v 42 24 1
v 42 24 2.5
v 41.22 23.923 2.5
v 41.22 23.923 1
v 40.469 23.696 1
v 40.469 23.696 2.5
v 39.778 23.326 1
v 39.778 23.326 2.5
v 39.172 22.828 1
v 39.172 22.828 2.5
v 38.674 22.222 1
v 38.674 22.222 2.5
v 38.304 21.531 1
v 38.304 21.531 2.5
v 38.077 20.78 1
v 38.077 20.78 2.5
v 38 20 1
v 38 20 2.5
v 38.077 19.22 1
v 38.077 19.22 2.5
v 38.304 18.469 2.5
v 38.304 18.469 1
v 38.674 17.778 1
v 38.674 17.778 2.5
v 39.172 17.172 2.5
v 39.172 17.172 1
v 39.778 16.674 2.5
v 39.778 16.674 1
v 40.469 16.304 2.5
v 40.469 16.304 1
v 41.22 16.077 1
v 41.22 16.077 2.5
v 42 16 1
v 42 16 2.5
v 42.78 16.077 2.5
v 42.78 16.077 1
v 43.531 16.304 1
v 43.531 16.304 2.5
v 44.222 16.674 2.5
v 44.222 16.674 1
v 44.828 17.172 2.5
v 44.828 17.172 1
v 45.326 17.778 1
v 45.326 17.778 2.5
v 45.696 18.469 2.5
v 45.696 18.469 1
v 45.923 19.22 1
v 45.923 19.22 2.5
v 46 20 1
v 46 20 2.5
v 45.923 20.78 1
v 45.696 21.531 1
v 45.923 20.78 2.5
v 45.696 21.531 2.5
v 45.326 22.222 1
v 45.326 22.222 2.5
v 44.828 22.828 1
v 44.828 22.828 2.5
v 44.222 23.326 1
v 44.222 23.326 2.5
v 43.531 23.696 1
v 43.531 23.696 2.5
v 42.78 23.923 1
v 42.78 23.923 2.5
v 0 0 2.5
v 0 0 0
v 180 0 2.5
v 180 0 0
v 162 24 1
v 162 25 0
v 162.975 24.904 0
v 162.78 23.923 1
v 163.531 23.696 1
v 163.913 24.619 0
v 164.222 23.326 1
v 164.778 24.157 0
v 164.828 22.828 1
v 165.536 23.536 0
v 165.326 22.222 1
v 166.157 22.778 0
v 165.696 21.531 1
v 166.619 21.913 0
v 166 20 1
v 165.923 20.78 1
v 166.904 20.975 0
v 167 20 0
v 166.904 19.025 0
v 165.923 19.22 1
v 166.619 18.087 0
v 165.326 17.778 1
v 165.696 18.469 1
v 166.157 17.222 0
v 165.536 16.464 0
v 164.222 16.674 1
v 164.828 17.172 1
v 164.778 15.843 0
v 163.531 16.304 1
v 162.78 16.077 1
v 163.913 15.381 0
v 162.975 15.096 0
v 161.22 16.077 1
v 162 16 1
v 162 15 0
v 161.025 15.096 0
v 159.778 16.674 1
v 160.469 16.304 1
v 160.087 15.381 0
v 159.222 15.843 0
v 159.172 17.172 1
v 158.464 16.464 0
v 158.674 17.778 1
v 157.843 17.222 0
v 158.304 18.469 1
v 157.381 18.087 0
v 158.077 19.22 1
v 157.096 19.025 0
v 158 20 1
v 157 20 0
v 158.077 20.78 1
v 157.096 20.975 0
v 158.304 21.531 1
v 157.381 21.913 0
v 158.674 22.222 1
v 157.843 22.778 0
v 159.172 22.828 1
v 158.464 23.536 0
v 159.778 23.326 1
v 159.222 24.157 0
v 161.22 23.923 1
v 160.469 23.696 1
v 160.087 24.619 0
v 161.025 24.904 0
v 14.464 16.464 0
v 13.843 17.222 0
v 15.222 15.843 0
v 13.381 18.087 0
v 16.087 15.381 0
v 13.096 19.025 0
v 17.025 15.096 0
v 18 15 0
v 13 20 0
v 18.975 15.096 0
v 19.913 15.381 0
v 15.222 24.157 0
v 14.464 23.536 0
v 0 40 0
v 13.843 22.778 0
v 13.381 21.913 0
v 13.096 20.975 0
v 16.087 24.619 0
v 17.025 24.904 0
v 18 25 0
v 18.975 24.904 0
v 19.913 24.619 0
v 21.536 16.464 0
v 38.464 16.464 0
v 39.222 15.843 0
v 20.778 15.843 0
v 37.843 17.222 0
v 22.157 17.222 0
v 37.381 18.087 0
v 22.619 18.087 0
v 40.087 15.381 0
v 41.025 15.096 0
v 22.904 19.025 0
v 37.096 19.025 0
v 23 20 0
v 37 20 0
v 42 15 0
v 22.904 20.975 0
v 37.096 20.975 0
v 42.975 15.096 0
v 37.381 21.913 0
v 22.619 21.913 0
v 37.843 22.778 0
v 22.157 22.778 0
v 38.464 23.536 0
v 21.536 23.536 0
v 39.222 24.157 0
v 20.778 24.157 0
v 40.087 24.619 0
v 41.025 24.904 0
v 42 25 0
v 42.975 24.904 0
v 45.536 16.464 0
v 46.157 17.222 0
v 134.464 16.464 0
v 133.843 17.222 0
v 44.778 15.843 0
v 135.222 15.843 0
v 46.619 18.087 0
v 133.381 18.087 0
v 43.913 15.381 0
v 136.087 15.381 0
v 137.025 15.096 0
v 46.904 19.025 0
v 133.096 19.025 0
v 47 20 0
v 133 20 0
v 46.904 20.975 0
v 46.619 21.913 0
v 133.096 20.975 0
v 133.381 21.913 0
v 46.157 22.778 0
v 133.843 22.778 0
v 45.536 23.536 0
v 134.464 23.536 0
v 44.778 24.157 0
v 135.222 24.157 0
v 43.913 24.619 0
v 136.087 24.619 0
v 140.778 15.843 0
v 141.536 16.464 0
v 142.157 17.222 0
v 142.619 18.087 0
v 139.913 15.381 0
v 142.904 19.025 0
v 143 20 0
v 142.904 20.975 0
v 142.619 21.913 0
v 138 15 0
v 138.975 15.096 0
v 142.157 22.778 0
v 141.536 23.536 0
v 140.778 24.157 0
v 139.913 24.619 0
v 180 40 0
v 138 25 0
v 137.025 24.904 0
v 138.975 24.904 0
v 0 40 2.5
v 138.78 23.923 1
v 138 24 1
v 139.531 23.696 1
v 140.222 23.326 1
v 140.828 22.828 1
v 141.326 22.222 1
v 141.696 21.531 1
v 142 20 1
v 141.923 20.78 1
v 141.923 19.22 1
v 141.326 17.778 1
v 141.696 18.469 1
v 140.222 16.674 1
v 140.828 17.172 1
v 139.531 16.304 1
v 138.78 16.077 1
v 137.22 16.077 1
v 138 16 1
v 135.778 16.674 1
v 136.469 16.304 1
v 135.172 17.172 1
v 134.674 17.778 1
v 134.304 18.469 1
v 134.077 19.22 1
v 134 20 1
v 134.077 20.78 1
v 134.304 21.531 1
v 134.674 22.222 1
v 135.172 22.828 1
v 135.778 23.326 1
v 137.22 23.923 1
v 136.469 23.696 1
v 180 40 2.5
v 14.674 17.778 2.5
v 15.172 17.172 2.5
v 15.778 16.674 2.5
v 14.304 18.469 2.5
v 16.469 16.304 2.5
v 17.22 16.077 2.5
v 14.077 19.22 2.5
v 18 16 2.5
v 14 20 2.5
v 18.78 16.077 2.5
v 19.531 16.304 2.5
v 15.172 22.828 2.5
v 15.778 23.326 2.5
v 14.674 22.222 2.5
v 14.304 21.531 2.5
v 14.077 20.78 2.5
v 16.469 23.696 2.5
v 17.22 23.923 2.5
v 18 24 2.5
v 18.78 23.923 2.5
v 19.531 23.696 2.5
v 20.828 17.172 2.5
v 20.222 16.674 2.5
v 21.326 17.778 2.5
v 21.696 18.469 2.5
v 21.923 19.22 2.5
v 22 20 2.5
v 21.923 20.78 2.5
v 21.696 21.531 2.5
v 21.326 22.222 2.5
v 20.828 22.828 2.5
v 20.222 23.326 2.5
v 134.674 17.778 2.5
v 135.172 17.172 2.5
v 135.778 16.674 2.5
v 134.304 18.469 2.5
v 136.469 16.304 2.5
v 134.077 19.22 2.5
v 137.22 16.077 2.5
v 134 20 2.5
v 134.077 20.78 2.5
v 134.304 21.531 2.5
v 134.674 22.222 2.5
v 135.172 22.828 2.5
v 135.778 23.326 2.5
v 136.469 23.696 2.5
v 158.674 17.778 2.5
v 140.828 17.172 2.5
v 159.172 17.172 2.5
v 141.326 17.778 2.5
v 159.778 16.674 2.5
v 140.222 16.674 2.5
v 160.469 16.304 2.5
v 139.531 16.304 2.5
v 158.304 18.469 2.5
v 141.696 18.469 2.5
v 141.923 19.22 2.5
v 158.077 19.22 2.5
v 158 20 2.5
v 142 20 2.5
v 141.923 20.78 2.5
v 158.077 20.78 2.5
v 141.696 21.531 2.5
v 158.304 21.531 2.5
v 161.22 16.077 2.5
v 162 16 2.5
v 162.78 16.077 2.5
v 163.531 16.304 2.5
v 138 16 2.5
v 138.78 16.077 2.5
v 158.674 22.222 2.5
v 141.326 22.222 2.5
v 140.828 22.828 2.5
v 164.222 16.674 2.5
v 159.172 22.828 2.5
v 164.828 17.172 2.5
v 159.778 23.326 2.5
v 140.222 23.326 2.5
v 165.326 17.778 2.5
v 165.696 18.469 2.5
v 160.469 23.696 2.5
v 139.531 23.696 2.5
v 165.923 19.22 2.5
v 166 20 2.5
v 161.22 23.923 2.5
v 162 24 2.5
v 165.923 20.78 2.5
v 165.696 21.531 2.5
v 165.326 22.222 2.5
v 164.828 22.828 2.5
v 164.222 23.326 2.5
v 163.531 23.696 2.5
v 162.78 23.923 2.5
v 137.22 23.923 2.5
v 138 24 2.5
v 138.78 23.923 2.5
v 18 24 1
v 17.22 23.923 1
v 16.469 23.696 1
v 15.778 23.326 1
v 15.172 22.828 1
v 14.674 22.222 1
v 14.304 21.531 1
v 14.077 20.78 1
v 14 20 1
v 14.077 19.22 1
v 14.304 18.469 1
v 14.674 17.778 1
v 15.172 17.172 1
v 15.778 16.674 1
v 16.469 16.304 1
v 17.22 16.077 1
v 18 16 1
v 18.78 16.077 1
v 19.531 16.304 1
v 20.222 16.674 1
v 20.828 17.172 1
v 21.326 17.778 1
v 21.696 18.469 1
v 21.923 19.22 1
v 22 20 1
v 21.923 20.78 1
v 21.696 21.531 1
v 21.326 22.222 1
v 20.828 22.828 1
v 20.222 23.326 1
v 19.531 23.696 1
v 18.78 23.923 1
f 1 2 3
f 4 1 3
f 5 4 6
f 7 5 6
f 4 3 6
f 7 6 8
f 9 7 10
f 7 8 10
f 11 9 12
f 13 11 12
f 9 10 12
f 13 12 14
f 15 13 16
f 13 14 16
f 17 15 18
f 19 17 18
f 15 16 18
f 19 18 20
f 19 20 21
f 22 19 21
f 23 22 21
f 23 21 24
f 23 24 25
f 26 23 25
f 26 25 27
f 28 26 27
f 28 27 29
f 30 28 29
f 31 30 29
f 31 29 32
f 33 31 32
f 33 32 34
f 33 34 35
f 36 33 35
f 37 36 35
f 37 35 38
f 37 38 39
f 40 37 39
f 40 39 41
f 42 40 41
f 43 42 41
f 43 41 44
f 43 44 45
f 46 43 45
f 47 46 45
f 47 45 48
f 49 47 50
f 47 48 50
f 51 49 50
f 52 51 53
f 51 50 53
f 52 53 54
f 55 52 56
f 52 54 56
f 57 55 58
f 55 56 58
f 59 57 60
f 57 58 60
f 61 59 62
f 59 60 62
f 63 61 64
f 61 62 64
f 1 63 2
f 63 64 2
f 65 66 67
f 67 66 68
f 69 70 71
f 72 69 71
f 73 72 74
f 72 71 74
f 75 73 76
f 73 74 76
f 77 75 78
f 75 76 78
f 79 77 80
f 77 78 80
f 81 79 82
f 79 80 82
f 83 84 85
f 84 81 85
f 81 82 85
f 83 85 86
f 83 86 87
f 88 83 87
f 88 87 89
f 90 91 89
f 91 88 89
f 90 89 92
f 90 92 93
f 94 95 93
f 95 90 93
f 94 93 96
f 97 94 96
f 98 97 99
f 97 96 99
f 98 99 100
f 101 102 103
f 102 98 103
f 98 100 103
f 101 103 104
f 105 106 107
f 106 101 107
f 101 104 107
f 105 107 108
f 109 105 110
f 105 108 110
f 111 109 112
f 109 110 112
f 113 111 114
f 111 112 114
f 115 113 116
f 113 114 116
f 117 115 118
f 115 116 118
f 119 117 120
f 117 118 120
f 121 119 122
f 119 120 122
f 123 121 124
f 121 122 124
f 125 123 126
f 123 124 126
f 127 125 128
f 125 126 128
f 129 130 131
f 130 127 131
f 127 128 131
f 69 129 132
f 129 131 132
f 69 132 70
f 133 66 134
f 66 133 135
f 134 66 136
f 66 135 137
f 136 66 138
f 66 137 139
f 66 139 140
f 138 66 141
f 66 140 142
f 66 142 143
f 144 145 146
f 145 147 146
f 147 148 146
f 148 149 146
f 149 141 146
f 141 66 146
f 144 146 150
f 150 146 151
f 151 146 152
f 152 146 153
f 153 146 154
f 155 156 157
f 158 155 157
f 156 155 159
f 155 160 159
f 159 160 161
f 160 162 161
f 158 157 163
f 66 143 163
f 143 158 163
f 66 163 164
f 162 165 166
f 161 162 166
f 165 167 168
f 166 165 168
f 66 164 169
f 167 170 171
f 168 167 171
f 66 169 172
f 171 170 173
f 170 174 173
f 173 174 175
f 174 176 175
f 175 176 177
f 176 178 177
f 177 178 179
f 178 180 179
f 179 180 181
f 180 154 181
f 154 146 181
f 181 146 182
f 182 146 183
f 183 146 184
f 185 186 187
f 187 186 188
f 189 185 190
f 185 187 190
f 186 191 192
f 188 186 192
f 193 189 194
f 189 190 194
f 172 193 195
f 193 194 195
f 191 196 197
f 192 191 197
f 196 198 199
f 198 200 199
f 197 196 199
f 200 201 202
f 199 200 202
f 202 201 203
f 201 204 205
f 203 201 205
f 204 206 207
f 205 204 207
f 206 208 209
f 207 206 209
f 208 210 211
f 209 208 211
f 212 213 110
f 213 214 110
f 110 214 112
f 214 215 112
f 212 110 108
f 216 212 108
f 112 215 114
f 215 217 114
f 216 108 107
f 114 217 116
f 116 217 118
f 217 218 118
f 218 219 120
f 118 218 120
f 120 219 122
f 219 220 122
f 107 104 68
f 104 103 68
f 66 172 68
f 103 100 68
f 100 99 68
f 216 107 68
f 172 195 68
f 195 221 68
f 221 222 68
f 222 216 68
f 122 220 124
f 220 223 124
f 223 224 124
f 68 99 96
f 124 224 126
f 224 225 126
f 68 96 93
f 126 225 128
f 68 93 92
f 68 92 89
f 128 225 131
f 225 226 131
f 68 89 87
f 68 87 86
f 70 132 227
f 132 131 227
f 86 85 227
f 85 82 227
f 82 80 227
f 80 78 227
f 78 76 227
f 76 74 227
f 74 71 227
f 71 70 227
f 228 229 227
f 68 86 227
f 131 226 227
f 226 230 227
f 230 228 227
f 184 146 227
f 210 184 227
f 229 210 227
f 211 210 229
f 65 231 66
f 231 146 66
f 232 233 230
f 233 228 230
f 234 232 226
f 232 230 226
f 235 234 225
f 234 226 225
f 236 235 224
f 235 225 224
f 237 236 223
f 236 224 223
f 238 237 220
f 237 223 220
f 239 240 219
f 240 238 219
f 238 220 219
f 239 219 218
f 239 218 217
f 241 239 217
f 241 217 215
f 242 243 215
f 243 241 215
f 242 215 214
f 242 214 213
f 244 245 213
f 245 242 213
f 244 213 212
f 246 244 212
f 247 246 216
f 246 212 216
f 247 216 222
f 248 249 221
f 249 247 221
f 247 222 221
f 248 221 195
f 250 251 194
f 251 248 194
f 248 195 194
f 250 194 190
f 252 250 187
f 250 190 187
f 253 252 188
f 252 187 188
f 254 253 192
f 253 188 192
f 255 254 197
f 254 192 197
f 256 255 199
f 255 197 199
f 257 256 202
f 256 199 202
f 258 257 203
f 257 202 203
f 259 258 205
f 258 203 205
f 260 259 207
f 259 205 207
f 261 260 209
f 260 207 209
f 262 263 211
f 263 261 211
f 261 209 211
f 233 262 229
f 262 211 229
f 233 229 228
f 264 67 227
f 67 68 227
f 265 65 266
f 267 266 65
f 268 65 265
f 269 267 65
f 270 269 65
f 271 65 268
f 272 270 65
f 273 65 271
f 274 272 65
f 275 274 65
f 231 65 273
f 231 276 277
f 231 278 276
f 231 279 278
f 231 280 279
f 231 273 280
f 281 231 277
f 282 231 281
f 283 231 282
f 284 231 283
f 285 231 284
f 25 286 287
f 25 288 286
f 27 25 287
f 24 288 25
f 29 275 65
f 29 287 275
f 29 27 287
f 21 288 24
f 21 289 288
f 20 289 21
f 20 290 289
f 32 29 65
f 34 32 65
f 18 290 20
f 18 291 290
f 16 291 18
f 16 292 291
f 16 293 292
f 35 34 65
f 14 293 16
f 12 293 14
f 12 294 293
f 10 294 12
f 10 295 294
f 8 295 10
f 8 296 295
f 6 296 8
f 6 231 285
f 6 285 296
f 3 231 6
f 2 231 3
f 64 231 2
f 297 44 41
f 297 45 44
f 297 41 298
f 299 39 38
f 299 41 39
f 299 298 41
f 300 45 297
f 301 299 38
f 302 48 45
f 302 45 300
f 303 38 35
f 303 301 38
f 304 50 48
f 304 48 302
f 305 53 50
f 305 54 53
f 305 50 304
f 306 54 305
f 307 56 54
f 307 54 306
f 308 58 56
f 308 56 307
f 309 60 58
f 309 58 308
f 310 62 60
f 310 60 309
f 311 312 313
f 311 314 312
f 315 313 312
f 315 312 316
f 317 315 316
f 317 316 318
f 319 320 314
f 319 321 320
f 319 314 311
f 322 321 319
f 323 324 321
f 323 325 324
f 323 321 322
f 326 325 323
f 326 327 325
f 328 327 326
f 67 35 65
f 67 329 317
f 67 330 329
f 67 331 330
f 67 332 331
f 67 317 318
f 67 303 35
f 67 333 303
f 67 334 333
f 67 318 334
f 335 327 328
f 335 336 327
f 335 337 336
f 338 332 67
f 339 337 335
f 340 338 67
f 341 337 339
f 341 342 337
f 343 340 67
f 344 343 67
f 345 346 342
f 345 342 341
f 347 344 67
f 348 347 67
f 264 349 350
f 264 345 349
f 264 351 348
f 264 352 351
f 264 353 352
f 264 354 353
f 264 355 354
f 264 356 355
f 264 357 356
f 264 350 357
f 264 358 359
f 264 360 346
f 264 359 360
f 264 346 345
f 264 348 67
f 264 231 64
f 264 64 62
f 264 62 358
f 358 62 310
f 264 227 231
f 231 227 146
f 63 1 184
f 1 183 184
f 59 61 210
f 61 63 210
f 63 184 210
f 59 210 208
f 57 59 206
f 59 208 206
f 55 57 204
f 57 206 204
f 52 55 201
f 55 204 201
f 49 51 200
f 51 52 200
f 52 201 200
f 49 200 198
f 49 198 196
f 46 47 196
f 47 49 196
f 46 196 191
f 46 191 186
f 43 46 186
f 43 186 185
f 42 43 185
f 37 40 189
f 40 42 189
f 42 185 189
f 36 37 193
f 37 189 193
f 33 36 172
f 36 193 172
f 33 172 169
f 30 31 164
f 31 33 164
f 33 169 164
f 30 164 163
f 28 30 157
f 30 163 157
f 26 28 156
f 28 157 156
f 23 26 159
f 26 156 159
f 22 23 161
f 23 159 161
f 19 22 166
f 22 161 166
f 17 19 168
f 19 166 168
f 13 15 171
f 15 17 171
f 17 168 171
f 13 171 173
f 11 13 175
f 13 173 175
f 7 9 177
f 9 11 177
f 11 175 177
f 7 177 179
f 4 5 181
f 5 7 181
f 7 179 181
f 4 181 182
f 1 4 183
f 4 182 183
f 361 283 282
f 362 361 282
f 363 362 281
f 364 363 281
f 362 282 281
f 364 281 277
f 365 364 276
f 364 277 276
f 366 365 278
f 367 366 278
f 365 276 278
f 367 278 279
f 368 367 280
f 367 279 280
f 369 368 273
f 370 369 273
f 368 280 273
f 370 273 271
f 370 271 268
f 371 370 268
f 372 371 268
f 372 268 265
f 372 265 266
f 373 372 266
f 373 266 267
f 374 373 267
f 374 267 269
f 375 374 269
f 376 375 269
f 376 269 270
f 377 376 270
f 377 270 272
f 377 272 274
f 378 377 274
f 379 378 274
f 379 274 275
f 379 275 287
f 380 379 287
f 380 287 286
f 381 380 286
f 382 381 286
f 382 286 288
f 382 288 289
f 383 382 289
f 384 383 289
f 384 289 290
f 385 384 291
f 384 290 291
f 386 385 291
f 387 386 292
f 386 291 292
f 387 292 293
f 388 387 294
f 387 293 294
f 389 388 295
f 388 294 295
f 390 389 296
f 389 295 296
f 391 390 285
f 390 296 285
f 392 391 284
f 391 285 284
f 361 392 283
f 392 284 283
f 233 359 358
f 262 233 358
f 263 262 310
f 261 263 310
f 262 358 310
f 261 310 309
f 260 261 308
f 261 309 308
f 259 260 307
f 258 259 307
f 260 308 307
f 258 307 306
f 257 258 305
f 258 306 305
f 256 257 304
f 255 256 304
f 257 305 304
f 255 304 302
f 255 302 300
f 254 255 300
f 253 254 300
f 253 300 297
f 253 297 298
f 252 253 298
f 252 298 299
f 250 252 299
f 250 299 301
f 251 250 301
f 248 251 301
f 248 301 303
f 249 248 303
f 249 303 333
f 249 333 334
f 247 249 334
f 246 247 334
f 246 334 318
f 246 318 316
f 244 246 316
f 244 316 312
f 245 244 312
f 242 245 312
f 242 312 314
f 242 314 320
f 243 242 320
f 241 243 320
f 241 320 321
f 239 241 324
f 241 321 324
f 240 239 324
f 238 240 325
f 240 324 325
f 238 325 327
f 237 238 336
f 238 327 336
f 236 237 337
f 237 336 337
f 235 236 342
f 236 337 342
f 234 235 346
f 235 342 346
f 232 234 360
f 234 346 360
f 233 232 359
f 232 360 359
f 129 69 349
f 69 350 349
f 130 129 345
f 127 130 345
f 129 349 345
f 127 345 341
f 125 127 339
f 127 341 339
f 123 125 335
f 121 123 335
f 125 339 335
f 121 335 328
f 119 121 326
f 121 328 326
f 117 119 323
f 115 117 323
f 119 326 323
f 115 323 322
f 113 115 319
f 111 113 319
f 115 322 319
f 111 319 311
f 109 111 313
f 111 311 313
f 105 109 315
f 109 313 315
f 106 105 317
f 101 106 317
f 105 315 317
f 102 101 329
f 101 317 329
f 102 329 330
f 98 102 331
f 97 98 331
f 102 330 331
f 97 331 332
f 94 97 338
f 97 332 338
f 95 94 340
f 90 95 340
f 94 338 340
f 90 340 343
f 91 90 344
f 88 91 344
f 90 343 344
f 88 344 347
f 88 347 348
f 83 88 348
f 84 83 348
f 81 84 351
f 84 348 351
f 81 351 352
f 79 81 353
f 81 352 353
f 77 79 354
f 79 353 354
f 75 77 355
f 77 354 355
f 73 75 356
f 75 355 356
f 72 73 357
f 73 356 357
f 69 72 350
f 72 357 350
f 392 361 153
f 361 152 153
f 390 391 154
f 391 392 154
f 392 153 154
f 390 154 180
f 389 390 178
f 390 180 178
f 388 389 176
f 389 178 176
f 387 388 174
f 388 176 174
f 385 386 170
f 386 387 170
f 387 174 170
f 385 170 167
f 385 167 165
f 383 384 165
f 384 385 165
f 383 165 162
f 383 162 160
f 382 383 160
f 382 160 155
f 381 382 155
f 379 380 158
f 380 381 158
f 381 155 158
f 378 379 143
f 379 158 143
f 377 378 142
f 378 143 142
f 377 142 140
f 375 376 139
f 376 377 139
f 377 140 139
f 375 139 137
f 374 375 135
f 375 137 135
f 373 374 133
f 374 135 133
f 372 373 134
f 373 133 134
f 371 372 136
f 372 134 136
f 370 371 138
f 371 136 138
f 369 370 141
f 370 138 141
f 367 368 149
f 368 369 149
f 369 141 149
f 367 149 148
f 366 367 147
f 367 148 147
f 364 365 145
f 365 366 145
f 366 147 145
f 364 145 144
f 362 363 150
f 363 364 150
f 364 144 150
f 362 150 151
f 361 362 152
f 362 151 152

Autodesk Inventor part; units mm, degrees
ref_plane "YZ Plane" through (0, 0, 0) normal (1, 0, 0) x (0, 1, 0)
ref_plane "XZ Plane" through (0, 0, 0) normal (0, 1, 0) x (-1, 0, 0)
ref_plane "XY Plane" through (0, 0, 0) normal (0, 0, 1) x (1, 0, 0)
sketch "Szkic1" plane through (0, 0, 0) normal (0, 0, 1) x (1, 0, 0)
  line L0 (0, 0) -> (180, 0)
  line L1 (180, 0) -> (180, 40)
  line L2 (180, 40) -> (0, 40)
  line L3 (0, 40) -> (0, 0)
  line L4 (0, 20) -> (180, 20) construction
  line L5 (90, 0) -> (90, 40) construction
  line L6 (45, 0) -> (45, 40) construction
  line L7 (18, 40) -> (18, 0) construction
  circle A0 centre (18, 20) radius 4
  line L8 (30, 40) -> (30, 0) construction
  circle A1 centre (42, 20) radius 4
  circle A2 centre (162, 20) radius 4
  circle A3 centre (138, 20) radius 4
  dimension "d0" = 180
  dimension "d1" = 40
  dimension "d2" = 45
  dimension "d3" = 18
  dimension "d5" = 8
  dimension "d6" = 30
extrude "Wyciągnięcie proste1" add sketch "Szkic1" along normal blind 2.5 contours L3 L2 L1 L0 | A0 | A1 | A2 | A3
hole "Otwór2" at (18, 20, 0) at (42, 20, 0) at (138, 20, 0) at (162, 20, 0) direction (0, 0, 1) diameter 8 end through all countersink diameter 10 countersink angle 90
properties part number "lacznik_plaski_180_40_2p5"
